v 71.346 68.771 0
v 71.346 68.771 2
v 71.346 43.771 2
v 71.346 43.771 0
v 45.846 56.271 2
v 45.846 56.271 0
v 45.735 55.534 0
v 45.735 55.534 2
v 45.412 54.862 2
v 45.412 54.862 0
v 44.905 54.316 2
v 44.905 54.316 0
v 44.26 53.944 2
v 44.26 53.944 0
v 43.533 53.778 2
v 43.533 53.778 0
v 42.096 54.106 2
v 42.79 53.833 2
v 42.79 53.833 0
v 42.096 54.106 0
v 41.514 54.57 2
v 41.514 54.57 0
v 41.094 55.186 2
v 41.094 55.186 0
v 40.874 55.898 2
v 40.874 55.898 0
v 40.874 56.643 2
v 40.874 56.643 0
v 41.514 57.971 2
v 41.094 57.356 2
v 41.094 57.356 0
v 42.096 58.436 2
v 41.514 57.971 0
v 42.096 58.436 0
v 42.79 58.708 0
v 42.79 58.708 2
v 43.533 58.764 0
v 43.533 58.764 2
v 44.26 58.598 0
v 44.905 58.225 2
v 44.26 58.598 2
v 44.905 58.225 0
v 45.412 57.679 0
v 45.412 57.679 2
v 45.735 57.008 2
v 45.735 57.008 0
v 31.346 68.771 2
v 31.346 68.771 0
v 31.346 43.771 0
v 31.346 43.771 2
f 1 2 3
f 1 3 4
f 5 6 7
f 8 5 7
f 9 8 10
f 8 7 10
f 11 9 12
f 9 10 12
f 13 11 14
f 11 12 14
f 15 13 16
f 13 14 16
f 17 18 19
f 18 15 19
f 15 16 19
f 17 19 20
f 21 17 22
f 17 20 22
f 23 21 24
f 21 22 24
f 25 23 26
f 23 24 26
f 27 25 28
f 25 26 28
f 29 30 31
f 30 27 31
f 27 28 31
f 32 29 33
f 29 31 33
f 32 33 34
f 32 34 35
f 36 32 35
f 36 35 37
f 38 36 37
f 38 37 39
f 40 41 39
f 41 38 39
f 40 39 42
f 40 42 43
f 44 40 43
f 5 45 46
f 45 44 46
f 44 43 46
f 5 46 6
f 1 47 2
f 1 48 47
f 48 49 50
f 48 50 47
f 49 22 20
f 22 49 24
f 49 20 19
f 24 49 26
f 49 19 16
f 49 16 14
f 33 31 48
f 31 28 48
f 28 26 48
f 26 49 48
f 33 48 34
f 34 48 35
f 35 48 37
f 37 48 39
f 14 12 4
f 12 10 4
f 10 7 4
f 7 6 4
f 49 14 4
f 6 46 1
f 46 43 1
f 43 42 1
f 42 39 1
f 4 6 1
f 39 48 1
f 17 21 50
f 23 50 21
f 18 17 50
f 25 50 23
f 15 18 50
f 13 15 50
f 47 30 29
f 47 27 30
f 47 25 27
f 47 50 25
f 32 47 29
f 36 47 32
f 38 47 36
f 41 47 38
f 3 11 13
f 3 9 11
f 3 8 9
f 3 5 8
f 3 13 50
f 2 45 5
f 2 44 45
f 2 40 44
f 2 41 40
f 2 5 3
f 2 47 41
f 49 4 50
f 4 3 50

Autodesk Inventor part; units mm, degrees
ref_plane "YZ Plane" through (0, 0, 0) normal (1, 0, 0) x (0, 1, 0)
ref_plane "XZ Plane" through (0, 0, 0) normal (0, 1, 0) x (-1, 0, 0)
ref_plane "XY Plane" through (0, 0, 0) normal (0, 0, 1) x (1, 0, 0)
sketch "Sketch1" plane through (0, 0, 0) normal (0, 0, 1) x (1, 0, 0)
  line L0 (31.3464, 73.7708) -> (86.3464, 73.7708)
  line L1 (86.3464, 73.7708) -> (86.3464, 38.7708)
  line L2 (86.3464, 38.7708) -> (31.3464, 38.7708)
  line L3 (31.3464, 38.7708) -> (31.3464, 73.7708)
  circle A0 centre (43.3464, 56.2708) radius 2.5
  point P0 (0, 0)
  dimension "d0" = 55
  dimension "d1" = 35
  dimension "d3" = 5
extrude "Extrusion1" add sketch "Sketch1" along normal blind 2
sketch "Sketch2" plane through (0, 0, 2) normal (0, 0, 1) x (1, 0, 0)
  point P0 (0, 0)
thread "Thread1" size "M5x0.8" class "6H" standard "ANSI Metric M Profile" length 43.6
sketch "Sketch3" plane through (86.3464, 38.7708, 0) normal (1, 0, 0) x (0, 0, -1)
  point P0 (0, -38.7708)
sketch "Sketch4" plane through (0, 0, 2) normal (0, 0, 1) x (1, 0, 0)
  point P0 (0, 0)
sketch "Sketch5" plane through (86.3464, 38.7708, 0) normal (1, 0, 0) x (0, 0, -1)
  line L0 (-2, 0) -> (-2, 35) projected
  line L1 (-2, 35) -> (0, 35)
  line L2 (0, 35) -> (0, 0)
  line L3 (0, 0) -> (-2, 0)
  line L4 (-2, 0) -> (-2, 35)
  point P0 (0, -38.7708)
  dimension "d8" = 2
  dimension "d9" = 35
extrude "Extrusion2" cut sketch "Sketch5" against normal blind 15
sketch "Sketch6" plane through (0, 0, 2) normal (0, 0, 1) x (1, 0, 0)
  line L0 (31.3464, 38.7708) -> (71.3464, 38.7708) projected
  line L1 (31.3464, 38.7708) -> (71.3464, 38.7708)
  line L2 (71.3464, 38.7708) -> (71.3464, 43.7708)
  line L3 (71.3464, 43.7708) -> (31.3464, 43.7708)
  line L4 (31.3464, 43.7708) -> (31.3464, 38.7708)
  point P0 (0, 0)
  dimension "d12" = 40
  dimension "d13" = 5
extrude "Extrusion3" cut sketch "Sketch6" against normal blind 15
sketch "Sketch7" plane through (0, 0, 0) normal (0, 0, -1) x (-1, 0, 0)
  line L0 (-71.3464, 73.7708) -> (-31.3464, 73.7708) projected
  line L1 (-71.3464, 73.7708) -> (-31.3464, 73.7708)
  line L2 (-31.3464, 73.7708) -> (-31.3464, 68.7708)
  line L3 (-31.3464, 68.7708) -> (-71.3464, 68.7708)
  line L4 (-71.3464, 68.7708) -> (-71.3464, 73.7708)
  point P0 (0, 0)
  dimension "d16" = 40
  dimension "d17" = 5
extrude "Extrusion4" cut sketch "Sketch7" against normal blind 15
properties part number "Peyangga Samping Kamera"
